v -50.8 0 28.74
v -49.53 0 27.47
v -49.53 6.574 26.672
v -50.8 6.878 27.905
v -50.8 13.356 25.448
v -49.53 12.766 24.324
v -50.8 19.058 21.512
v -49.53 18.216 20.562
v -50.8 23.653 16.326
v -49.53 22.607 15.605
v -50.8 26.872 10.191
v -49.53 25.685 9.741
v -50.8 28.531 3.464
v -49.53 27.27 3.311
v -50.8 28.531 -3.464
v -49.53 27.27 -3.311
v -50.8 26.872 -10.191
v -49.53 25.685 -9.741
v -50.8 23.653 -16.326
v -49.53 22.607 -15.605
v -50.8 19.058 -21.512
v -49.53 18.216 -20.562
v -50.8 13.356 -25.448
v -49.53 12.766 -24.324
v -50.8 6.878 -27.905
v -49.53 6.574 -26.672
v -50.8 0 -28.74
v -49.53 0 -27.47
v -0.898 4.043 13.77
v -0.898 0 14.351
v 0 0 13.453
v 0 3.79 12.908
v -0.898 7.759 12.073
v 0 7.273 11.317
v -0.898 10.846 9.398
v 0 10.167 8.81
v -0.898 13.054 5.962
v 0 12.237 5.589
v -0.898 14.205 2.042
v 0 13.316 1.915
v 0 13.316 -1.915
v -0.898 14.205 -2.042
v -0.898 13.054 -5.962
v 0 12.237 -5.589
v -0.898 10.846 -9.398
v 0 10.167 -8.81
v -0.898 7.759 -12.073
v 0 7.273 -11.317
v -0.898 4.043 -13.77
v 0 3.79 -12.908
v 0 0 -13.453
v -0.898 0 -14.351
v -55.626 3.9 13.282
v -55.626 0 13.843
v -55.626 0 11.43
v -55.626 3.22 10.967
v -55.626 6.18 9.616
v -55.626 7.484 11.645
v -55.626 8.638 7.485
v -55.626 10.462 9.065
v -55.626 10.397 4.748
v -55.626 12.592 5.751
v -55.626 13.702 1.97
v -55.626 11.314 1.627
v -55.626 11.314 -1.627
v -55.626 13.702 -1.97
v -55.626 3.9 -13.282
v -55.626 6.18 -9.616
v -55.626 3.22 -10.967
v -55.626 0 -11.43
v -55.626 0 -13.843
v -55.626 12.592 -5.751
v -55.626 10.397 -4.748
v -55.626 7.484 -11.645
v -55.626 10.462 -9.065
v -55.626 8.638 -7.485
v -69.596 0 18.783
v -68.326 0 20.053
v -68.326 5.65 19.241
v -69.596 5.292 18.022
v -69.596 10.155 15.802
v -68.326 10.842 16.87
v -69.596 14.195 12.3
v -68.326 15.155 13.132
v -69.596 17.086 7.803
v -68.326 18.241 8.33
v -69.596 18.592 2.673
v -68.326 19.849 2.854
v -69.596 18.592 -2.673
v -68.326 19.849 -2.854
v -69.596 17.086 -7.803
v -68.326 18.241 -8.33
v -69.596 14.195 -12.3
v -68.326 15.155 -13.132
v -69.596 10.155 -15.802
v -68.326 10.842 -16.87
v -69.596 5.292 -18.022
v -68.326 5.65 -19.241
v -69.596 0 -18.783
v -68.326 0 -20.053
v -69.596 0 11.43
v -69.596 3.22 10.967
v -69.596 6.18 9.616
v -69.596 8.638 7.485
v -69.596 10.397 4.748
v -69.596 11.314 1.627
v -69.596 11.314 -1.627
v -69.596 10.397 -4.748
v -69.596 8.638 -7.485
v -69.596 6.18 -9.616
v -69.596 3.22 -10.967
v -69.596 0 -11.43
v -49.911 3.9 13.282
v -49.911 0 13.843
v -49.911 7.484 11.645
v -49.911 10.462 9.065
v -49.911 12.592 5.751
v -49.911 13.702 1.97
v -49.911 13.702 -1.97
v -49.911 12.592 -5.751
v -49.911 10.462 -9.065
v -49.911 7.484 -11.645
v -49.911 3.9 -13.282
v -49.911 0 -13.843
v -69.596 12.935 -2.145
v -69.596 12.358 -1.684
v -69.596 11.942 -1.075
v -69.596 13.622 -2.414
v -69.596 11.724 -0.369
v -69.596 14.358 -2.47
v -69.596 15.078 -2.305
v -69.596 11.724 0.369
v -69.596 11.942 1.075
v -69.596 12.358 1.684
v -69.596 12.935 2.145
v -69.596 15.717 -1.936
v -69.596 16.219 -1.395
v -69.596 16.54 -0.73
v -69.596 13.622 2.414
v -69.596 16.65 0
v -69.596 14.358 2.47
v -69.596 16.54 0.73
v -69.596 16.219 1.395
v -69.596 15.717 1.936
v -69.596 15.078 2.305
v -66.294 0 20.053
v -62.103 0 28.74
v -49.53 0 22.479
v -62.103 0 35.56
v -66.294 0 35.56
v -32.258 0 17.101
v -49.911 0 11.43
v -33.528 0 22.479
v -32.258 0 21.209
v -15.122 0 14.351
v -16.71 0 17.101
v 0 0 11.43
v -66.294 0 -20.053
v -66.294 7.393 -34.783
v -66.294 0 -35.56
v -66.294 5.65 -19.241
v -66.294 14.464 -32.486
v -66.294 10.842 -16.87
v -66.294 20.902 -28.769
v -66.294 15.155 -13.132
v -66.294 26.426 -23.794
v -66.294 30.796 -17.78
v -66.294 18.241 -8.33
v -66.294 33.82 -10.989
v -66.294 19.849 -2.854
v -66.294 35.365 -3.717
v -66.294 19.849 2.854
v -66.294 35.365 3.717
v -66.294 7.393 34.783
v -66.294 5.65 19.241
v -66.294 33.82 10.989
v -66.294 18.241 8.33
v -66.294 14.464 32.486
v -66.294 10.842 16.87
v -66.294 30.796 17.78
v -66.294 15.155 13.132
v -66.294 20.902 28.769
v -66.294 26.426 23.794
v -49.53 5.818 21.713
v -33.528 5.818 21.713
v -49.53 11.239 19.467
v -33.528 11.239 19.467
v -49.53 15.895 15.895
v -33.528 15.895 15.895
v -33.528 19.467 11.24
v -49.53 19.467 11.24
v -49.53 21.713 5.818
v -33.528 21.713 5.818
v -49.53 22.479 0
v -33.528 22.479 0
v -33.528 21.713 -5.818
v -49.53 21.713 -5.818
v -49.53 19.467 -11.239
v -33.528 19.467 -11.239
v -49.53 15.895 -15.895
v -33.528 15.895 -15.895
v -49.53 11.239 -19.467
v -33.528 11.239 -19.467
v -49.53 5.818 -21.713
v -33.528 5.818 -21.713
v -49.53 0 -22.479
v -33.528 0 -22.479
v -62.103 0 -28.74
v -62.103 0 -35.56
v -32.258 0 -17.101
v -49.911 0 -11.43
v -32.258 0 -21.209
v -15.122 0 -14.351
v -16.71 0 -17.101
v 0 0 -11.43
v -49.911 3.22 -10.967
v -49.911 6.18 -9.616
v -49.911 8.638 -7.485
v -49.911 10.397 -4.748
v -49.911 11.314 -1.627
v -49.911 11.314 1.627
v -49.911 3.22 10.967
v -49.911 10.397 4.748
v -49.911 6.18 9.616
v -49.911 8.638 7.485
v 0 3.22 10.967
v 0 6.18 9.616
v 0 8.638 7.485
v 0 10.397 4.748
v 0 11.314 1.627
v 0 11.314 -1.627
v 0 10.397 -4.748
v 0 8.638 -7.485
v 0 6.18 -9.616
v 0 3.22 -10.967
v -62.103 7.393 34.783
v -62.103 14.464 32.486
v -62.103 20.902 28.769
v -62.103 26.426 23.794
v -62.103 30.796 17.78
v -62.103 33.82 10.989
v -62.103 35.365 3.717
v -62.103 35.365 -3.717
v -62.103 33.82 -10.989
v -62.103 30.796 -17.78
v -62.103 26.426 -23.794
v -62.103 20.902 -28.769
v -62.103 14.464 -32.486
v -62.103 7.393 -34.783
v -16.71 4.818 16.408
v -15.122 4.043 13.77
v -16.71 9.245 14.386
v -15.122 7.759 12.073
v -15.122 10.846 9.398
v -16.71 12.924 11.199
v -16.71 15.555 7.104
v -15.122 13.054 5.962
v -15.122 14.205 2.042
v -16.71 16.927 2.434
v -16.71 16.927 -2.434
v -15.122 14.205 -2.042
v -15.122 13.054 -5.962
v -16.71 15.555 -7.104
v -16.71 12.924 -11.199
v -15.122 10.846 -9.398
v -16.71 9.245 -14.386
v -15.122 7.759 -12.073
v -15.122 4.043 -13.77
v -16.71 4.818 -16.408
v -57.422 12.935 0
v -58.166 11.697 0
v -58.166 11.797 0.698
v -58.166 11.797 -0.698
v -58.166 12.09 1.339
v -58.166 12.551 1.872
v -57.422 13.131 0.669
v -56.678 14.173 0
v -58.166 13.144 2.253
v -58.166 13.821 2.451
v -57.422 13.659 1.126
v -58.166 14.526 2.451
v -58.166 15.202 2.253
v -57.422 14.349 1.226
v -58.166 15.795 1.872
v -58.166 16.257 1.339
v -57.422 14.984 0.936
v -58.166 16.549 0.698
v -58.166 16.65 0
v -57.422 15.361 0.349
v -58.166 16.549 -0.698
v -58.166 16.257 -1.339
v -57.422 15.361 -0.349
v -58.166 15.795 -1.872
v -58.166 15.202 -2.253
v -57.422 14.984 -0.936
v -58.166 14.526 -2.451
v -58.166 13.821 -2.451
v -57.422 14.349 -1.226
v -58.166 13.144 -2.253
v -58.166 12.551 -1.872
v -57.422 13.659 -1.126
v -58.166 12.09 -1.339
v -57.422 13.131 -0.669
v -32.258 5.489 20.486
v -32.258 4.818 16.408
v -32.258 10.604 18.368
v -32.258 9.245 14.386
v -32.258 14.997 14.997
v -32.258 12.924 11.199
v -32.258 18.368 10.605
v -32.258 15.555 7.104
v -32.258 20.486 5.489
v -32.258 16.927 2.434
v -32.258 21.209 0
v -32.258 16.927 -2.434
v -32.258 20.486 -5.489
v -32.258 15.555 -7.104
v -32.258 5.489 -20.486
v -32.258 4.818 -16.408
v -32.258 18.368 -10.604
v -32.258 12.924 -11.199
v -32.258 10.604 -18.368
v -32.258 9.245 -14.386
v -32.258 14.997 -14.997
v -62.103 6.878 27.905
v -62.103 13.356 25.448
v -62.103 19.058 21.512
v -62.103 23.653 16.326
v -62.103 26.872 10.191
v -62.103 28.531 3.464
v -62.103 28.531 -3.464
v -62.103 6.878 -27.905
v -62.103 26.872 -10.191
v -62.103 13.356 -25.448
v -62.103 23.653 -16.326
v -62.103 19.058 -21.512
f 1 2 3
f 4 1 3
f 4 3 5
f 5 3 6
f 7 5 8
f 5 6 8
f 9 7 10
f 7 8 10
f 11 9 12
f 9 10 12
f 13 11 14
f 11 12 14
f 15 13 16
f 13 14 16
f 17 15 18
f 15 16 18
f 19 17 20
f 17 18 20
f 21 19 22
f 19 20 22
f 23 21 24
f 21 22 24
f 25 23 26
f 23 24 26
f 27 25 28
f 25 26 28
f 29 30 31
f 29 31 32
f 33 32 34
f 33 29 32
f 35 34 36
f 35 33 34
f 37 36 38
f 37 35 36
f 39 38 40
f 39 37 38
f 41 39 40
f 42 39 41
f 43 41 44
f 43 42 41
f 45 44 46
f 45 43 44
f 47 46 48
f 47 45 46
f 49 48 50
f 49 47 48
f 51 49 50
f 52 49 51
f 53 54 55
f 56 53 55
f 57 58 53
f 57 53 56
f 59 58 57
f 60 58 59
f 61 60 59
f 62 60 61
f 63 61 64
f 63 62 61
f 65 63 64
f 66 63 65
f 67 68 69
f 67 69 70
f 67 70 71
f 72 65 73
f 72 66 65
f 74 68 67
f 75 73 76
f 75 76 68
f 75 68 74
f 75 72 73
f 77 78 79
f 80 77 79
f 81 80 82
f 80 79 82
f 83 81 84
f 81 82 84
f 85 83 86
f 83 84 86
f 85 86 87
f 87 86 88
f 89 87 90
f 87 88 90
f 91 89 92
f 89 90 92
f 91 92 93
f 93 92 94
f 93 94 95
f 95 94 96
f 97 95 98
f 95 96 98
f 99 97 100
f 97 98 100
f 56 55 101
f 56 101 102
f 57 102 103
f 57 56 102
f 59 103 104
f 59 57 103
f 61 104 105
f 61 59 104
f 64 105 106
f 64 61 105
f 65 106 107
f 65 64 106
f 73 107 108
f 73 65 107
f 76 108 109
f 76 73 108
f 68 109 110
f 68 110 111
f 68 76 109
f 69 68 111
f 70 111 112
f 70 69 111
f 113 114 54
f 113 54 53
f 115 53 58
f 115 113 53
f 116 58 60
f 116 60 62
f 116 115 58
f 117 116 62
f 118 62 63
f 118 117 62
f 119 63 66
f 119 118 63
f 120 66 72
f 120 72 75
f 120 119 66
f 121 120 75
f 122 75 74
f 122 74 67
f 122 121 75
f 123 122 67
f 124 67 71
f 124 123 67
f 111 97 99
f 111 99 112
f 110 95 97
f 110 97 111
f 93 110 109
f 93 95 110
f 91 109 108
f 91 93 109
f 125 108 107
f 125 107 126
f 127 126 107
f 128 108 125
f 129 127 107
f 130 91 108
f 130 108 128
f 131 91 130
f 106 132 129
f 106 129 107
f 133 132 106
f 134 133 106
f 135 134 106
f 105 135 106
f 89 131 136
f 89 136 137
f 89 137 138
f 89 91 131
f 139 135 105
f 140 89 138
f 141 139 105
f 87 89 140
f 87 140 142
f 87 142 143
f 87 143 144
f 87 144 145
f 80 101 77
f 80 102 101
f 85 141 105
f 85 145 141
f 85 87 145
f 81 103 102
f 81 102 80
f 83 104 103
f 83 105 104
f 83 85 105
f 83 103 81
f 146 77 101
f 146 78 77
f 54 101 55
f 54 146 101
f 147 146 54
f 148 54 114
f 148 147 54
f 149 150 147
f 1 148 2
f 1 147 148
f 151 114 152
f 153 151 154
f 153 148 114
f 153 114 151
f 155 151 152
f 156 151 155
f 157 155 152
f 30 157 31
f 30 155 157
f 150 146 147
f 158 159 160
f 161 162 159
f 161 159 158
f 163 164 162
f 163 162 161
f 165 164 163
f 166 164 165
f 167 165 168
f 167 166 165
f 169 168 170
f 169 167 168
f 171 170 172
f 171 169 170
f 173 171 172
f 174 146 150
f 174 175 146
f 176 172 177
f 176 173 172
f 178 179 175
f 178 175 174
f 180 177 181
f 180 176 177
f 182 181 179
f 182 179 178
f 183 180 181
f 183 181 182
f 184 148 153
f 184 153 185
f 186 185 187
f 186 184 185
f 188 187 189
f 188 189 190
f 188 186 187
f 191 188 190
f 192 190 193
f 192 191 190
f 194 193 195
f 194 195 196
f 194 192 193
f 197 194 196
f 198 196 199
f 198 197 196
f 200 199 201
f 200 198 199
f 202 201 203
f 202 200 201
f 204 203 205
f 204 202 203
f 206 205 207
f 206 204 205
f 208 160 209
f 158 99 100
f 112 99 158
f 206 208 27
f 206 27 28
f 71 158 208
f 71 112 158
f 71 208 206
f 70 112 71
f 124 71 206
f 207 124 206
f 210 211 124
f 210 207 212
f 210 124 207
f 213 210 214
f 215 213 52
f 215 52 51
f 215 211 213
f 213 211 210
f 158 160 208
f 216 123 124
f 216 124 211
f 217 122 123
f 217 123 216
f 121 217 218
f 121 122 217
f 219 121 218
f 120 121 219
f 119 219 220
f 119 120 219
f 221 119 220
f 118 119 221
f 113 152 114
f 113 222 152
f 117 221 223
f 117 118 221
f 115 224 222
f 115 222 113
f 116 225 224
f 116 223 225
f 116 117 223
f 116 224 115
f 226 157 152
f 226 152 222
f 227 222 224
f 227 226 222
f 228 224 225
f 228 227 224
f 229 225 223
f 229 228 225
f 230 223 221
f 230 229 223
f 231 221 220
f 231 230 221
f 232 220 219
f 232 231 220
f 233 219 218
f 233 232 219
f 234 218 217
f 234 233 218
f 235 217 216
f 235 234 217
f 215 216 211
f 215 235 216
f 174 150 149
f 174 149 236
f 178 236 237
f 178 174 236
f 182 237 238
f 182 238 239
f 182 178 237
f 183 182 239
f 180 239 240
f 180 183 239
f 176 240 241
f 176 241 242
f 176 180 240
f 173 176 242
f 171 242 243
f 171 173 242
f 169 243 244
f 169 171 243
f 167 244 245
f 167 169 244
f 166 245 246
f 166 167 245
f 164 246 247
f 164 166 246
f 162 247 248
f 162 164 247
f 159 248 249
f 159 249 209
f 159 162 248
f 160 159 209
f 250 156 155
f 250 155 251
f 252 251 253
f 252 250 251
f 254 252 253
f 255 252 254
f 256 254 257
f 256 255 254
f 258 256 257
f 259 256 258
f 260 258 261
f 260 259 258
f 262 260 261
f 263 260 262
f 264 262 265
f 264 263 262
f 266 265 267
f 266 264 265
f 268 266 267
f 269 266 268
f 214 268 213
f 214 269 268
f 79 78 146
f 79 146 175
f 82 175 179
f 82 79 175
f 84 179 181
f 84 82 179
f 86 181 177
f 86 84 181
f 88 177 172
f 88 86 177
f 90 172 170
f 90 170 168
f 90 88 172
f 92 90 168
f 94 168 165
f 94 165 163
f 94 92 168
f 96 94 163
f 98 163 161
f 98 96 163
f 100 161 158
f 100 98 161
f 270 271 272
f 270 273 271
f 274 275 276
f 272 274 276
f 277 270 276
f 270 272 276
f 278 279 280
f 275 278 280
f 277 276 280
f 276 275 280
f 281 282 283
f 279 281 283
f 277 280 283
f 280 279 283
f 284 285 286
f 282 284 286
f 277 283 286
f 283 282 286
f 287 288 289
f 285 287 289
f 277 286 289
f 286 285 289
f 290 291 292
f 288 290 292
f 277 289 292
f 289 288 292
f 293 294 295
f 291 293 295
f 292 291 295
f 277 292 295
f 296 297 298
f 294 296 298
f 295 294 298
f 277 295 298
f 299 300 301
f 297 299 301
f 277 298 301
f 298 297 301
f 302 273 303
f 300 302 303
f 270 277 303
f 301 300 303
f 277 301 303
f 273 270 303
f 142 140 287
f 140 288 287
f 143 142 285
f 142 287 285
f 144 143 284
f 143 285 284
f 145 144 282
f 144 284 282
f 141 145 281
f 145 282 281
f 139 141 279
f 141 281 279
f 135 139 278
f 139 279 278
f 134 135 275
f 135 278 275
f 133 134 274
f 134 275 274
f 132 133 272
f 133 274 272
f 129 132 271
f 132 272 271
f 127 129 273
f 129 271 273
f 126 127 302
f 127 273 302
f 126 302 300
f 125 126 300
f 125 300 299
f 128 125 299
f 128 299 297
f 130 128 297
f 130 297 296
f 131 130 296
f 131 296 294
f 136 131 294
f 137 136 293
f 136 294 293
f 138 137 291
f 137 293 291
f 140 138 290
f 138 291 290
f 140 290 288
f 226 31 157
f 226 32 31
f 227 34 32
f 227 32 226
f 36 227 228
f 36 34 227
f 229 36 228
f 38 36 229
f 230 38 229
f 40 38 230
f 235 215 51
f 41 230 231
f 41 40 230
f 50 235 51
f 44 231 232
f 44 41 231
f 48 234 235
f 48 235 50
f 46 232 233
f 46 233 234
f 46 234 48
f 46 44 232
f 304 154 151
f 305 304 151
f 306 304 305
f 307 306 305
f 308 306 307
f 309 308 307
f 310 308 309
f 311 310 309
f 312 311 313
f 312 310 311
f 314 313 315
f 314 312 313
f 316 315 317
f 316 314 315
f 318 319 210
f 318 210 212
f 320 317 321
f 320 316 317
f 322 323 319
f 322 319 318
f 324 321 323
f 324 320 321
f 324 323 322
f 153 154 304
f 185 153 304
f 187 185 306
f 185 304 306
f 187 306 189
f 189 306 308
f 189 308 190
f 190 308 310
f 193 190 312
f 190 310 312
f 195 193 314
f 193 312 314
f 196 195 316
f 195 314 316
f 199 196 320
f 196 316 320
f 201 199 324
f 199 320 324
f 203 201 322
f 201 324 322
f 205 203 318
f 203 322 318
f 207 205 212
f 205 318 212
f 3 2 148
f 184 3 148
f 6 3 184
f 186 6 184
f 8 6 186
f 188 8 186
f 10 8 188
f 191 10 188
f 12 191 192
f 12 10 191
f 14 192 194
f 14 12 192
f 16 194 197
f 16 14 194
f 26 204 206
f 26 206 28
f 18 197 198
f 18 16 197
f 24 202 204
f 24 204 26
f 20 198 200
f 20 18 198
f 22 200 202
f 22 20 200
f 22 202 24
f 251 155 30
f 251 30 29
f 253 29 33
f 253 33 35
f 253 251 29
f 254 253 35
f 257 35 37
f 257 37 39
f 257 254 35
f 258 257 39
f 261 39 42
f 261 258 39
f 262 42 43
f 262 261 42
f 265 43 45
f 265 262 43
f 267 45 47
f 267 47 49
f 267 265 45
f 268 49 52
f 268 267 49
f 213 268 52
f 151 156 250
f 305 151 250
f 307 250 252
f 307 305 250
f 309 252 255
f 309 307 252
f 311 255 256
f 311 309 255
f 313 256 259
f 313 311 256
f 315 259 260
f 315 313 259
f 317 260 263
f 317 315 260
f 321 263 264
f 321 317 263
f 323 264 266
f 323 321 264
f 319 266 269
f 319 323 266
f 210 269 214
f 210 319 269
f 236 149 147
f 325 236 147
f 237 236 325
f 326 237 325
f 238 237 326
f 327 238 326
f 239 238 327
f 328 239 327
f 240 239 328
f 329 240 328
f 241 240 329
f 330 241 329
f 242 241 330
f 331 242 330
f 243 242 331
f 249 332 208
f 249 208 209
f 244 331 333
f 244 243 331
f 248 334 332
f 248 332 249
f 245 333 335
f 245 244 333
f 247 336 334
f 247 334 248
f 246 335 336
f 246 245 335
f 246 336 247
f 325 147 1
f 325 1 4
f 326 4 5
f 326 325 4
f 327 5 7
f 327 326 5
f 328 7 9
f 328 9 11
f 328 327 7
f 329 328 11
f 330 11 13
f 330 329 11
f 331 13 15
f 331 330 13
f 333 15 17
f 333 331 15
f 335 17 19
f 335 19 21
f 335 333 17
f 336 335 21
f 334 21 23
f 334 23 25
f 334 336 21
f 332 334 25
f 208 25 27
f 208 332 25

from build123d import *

# Parameters (mm, degrees)
F2_W     = 76.4627605677
F2_H     = 78.6305181682
F3_DEPTH = 35.561
F4_SIZE  = 1.27
F6_D     = 4.953
F6_DEPTH = 11.43
F6_TIP   = 1.488031323


with BuildPart() as f1:
    # F0 (on Front) → F1 (revolve)
    with BuildSketch(Plane.XZ):
        Polygon((-49.911, 11.43), (0, 11.43), (0, 13.4529743879), (-0.8980256121, 14.351), (-15.1220256121, 14.351), (-16.7095256121, 17.100630657), (-32.258, 17.100630657), (-32.258, 22.479), (-49.53, 22.479), (-49.53, 28.7401), (-62.103, 28.7401), (-62.103, 35.56), (-66.294, 35.56), (-66.294, 20.0533), (-69.596, 20.0533), (-69.596, 11.43), (-55.626, 11.43), (-55.626, 13.843), (-49.911, 13.843), align=None)
    revolve(axis=Axis((-34.5281772316, 0, 0), (-1, 0, 0)))

    # F2 (on Front) → F3 (cut, through all)
    with BuildSketch(Plane.XZ):
        with Locations((-38.2313802838, 0.098535791)):
            Rectangle(F2_W, F2_H)
    extrude(amount=F3_DEPTH, mode=Mode.SUBTRACT)

    # F4
    f4_edges = [f1.edges().sort_by_distance(p)[0] for p in [
        (-69.596, 20.0533, 0),
        (-49.53, 28.7401, 0),
        (-32.258, 22.479, 0),
    ]]
    chamfer(f4_edges, length=F4_SIZE)

    # F6
    with Locations(Plane(origin=(-69.596, 0, 0), x_dir=(0, -1, 0), z_dir=(-1, 0, 0))):
        with Locations((-14.1731563031, 0)):
            Hole(F6_D / 2, depth=F6_DEPTH)
            with Locations((0, 0, -(F6_DEPTH + F6_TIP / 2))):  # 118° drill point
                Cone(0, F6_D / 2, F6_TIP, mode=Mode.SUBTRACT)


solid = f1.part
